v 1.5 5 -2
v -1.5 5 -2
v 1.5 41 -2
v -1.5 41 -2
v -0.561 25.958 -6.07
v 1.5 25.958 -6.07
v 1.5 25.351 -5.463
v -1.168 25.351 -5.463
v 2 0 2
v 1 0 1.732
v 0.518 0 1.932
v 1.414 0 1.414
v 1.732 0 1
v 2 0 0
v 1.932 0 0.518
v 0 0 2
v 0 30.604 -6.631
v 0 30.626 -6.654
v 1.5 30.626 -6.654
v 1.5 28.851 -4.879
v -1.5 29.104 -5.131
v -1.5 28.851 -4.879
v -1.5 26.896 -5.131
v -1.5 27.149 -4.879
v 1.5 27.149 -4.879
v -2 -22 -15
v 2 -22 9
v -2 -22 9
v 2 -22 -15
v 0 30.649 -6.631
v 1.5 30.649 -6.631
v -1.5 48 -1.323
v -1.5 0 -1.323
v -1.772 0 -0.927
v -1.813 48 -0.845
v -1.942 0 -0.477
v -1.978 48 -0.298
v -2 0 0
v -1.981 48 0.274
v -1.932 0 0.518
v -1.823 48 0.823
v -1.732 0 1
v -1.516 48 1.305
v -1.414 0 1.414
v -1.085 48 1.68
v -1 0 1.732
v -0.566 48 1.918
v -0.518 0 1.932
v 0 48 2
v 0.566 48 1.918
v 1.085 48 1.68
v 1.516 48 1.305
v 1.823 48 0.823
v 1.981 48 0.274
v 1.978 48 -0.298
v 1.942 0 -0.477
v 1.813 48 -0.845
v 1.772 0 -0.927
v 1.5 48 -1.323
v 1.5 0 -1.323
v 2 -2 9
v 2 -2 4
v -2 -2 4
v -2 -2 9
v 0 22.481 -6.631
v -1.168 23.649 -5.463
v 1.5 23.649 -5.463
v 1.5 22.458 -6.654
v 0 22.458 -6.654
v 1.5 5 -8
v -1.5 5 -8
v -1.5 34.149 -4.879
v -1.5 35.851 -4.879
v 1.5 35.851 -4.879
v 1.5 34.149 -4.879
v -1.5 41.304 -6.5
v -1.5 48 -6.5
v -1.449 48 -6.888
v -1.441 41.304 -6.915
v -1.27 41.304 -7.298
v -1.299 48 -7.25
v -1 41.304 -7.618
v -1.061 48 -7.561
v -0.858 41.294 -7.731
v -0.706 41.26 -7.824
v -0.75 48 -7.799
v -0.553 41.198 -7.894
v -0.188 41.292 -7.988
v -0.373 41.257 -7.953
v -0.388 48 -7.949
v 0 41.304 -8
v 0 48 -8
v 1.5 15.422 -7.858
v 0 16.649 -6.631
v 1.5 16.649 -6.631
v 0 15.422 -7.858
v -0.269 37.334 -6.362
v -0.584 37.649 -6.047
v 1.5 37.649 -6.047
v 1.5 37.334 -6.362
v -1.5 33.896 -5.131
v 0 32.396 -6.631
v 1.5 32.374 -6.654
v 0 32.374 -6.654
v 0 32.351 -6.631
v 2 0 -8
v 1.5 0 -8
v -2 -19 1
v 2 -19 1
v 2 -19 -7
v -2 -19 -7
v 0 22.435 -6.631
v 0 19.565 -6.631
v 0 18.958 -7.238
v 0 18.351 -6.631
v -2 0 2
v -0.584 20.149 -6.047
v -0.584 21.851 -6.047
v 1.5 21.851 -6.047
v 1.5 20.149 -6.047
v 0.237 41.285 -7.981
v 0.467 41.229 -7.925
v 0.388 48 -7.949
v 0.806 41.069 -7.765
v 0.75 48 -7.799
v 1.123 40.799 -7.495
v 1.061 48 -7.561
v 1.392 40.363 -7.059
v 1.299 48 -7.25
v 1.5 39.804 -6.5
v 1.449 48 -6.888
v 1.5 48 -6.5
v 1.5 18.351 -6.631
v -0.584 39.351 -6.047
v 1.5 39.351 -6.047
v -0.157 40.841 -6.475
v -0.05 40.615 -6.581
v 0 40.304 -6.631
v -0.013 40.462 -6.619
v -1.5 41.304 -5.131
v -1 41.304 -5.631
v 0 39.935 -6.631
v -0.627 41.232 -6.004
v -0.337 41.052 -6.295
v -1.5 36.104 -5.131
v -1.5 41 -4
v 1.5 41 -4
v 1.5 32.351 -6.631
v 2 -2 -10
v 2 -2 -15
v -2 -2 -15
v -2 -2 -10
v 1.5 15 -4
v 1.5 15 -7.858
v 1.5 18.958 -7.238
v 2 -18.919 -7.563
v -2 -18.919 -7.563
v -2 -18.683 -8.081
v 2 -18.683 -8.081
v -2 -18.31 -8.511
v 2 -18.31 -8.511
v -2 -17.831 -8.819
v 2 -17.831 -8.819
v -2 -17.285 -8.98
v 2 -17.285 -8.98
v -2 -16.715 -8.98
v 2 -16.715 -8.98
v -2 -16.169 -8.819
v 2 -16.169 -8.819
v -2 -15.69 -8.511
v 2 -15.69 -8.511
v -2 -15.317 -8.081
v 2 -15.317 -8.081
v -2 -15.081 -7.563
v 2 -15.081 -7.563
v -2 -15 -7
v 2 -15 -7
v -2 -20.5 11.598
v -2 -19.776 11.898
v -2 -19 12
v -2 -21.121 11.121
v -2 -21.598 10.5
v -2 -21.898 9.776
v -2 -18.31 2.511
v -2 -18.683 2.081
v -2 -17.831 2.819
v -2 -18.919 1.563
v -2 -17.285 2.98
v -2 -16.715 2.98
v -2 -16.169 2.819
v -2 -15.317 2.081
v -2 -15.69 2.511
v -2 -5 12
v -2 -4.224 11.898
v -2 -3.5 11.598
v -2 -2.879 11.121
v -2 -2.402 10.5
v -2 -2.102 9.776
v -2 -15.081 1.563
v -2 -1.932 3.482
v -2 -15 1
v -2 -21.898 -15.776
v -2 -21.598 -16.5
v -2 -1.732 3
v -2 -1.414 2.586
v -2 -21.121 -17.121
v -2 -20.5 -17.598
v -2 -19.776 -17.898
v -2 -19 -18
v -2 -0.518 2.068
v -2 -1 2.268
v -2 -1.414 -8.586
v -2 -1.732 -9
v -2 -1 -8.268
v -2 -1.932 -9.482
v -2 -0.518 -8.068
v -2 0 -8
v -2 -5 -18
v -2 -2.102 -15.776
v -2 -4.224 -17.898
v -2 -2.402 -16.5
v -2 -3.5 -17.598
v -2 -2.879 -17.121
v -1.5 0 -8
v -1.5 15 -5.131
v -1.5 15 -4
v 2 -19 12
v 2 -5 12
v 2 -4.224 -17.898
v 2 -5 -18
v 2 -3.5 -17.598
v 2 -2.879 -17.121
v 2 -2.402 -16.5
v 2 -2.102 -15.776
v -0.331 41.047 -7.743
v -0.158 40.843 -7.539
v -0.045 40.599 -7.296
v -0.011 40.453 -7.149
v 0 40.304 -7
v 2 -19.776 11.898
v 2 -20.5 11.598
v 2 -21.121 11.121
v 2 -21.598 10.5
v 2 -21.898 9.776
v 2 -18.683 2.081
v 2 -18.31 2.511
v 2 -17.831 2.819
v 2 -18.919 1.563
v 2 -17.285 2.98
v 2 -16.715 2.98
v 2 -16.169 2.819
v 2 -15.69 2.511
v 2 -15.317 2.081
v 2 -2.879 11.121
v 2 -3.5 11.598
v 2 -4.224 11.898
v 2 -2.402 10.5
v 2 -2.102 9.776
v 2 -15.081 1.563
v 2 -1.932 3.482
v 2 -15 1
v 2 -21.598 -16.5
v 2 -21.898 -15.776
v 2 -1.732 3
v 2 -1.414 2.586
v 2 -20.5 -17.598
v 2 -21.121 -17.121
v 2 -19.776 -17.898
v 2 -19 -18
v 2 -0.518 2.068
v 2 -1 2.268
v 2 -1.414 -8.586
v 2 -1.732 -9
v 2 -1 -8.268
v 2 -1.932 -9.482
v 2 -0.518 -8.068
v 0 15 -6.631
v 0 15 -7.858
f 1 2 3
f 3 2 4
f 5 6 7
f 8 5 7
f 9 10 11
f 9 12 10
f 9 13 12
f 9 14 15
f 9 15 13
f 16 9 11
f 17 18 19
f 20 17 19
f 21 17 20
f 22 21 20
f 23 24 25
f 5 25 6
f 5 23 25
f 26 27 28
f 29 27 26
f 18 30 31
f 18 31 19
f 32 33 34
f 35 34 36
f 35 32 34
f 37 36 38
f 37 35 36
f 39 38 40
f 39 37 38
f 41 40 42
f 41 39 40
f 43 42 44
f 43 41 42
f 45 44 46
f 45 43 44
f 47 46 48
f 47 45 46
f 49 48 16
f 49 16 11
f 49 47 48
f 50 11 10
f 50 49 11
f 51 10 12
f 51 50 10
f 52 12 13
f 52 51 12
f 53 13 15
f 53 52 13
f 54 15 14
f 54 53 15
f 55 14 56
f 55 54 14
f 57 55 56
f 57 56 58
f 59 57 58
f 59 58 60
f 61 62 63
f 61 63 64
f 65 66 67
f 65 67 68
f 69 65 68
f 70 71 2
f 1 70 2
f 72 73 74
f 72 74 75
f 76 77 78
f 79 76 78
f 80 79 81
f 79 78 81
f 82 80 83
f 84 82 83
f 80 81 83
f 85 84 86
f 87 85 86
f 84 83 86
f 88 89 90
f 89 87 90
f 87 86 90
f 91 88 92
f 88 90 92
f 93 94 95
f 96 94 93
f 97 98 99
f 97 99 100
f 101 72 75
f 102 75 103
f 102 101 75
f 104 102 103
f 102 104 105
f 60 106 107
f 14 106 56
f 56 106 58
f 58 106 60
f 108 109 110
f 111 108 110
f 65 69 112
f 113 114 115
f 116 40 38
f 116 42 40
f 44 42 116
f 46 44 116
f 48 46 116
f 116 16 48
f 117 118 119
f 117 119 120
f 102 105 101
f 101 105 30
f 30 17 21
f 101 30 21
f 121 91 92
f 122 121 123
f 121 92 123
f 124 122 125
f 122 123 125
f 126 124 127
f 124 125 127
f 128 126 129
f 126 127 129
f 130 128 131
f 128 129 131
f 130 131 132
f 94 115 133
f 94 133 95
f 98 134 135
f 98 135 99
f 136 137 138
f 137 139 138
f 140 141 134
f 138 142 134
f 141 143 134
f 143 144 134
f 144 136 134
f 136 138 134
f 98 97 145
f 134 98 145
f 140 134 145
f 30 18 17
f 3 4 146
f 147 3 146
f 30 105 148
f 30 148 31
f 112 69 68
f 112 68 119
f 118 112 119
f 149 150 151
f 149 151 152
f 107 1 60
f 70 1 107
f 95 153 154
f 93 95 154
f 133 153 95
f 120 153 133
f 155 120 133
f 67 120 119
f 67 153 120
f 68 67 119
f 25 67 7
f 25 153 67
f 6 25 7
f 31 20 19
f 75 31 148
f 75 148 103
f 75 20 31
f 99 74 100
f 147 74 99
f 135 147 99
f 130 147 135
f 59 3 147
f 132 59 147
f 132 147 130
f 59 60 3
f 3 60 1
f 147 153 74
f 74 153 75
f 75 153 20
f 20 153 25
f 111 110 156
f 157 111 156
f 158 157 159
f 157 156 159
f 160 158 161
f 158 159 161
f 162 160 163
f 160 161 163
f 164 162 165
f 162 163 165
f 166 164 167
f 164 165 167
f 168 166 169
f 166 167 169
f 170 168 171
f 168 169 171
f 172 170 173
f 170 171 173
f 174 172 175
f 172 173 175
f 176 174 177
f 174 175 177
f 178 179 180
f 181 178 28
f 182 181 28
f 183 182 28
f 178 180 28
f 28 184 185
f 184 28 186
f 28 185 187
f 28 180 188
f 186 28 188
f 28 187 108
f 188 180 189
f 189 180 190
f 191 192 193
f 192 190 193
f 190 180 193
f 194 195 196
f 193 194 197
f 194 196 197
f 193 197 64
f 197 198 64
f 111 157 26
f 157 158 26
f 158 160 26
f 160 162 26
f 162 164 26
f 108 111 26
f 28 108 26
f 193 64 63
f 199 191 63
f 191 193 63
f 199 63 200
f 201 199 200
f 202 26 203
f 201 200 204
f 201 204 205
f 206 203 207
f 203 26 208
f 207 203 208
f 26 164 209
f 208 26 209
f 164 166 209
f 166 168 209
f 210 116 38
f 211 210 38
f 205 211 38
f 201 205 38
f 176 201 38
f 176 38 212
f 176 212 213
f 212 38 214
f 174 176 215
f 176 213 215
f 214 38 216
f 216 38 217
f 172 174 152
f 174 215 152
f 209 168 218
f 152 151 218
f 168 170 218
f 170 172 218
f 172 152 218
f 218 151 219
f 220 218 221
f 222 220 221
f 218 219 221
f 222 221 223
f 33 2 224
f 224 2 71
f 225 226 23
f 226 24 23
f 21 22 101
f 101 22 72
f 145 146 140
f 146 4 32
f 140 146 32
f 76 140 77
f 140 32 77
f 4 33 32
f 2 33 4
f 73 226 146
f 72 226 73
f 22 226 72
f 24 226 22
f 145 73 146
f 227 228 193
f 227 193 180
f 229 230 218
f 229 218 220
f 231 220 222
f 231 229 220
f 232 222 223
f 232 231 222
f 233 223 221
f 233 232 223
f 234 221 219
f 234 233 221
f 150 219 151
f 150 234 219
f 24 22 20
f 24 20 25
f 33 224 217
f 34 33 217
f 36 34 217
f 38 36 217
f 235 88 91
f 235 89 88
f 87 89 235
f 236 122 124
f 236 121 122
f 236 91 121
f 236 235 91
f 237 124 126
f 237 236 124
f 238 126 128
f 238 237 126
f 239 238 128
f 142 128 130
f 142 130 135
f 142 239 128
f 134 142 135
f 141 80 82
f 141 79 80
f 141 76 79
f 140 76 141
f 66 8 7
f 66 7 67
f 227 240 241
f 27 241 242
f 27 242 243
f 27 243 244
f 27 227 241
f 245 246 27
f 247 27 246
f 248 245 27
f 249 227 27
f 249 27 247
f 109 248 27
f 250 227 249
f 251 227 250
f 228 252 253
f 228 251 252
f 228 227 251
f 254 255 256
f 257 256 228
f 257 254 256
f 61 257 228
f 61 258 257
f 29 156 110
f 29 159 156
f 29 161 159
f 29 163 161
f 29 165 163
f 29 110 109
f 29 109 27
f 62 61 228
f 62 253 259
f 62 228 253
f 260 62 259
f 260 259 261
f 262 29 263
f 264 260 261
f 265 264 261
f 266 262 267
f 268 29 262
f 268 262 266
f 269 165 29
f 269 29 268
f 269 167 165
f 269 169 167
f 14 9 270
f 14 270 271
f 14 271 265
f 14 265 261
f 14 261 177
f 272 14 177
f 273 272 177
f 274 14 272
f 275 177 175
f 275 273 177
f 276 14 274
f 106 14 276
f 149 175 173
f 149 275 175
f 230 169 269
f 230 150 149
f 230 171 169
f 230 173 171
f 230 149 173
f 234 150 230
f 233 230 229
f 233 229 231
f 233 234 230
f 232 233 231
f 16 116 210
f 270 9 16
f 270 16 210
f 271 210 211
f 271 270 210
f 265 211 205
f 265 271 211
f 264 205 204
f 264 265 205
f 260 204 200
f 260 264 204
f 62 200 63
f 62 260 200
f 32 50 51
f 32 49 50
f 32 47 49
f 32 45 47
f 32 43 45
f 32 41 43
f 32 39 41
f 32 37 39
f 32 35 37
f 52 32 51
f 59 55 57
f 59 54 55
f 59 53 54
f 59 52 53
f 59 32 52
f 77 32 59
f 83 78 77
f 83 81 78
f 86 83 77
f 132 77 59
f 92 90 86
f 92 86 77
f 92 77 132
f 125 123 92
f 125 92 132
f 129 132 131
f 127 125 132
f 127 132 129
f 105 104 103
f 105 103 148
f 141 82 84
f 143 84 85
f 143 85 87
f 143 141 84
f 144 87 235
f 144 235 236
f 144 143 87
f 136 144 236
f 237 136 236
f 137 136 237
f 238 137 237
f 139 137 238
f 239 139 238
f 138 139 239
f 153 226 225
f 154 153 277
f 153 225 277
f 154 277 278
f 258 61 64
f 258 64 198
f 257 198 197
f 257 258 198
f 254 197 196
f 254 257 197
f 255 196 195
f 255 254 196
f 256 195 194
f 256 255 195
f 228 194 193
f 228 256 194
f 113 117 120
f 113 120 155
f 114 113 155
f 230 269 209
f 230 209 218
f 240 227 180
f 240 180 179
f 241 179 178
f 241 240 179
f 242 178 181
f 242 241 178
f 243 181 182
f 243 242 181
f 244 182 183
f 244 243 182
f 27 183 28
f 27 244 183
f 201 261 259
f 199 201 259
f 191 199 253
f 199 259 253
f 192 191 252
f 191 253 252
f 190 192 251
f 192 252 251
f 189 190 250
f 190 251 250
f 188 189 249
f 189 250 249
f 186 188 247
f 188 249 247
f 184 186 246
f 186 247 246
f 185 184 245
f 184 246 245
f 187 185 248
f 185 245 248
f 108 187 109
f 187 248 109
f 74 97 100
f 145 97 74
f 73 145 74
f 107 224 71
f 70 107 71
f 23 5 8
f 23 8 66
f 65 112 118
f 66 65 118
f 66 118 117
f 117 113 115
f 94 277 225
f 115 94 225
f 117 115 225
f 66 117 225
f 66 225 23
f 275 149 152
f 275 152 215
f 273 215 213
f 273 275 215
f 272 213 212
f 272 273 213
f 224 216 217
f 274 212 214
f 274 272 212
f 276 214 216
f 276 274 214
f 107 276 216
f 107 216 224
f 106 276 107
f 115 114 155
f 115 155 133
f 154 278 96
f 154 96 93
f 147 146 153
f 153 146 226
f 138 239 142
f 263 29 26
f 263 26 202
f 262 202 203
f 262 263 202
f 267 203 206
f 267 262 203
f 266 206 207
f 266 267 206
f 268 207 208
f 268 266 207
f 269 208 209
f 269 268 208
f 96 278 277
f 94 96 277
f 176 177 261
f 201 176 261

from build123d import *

# Parameters (mm, degrees)
BOSS_EXTRUDE2_DEPTH      = 1.5
BOSS_EXTRUDE2_DEPTH_BACK = 1.5
SKETCH2_R                = 2
BOSS_EXTRUDE3_DEPTH      = 48
BOSS_EXTRUDE4_DEPTH      = 0.5
BOSS_EXTRUDE4_DEPTH_BACK = 3.5
CUT_EXTRUDE1_DEPTH       = 3
CUT_EXTRUDE2_DEPTH       = 26.3039
FILLET1_R                = 1
CUT_EXTRUDE4_REACH       = 74.305
CUT_EXTRUDE5_REACH       = 43.195
SKETCH10_W               = 3
SKETCH10_H               = 0.141883177


with BuildPart() as part:
    # Sketch1 → Boss-Extrude2 (new, two sides: drawn at the far end of the back side and taken through both)
    with BuildSketch(Plane(origin=(0, 108.422012546, -620.347507802), x_dir=(0, 0, -1), z_dir=(1, 0, 0)).offset(-BOSS_EXTRUDE2_DEPTH_BACK)):
        Polygon((-620.347507802, -60.422012546), (-620.347507802, -108.422012546), (-612.347507802, -108.422012546), (-612.347507802, -103.422012546), (-618.347507802, -103.422012546), (-618.347507802, -67.422012546), (-616.347507802, -67.422012546), (-616.347507802, -93.422012546), (-612.347507802, -93.422012546), (-612.347507802, -64.422012546), (-612.347507802, -60.422012546), align=None)
    extrude(amount=BOSS_EXTRUDE2_DEPTH + BOSS_EXTRUDE2_DEPTH_BACK)

    # Sketch2 → Boss-Extrude3 (add)
    with BuildSketch(Plane(origin=(0, 48, 0), x_dir=(1, 0, 0), z_dir=(0, 1, 0))):
        Circle(SKETCH2_R)
    extrude(amount=-BOSS_EXTRUDE3_DEPTH)

    # Sketch4 → Boss-Extrude4 (add, two sides: drawn at the far end of the back side and taken through both)
    with BuildSketch(Plane.ZY.offset(1.5).offset(-BOSS_EXTRUDE4_DEPTH_BACK)):
        with BuildLine():
            Line((-8, 0), (2, 0))
            ThreePointArc((2, 0), (2.585786438, -1.414213562), (4, -2))
            Line((4, -2), (9, -2))
            ThreePointArc((9, -2), (11.121320344, -2.878679656), (12, -5))
            Line((12, -5), (12, -19))
            ThreePointArc((12, -19), (11.121320344, -21.121320344), (9, -22))
            Line((9, -22), (-15, -22))
            ThreePointArc((-15, -22), (-17.121320344, -21.121320344), (-18, -19))
            Line((-18, -19), (-18, -5))
            ThreePointArc((-18, -5), (-17.121320344, -2.878679656), (-15, -2))
            Line((-15, -2), (-10, -2))
            ThreePointArc((-10, -2), (-8.585786438, -1.414213562), (-8, 0))
        make_face()
        with BuildLine():
            Line((-7, -15), (1, -15))
            ThreePointArc((1, -15), (3, -17), (1, -19))
            Line((1, -19), (-7, -19))
            ThreePointArc((-7, -19), (-9, -17), (-7, -15))
        make_face(mode=Mode.SUBTRACT)
    extrude(amount=BOSS_EXTRUDE4_DEPTH + BOSS_EXTRUDE4_DEPTH_BACK)

    # Sketch6 → Cut-Extrude1 (cut)
    with BuildSketch(Plane.ZY.offset(1.5)):
        Polygon((-6.6312, 18.3509), (-6.6312, 16.6491), (-8.2803, 15), (-10.2803, 15), (-10.2803, 41.5842), (-8.2803, 41.5842), (-6.047, 39.3509), (-6.047, 37.6491), (-6.3619, 37.3342), (-4.8786, 35.8509), (-4.8786, 34.1491), (-6.654, 32.3737), (-6.6312, 32.3509), (-6.6312, 30.6491), (-6.654, 30.6263), (-4.8786, 28.8509), (-4.8786, 27.1491), (-6.0698, 25.9579), (-5.4628, 25.3509), (-5.4628, 23.6491), (-6.654, 22.4579), (-6.047, 21.8509), (-6.047, 20.1491), (-7.2382, 18.9579), align=None)
    extrude(amount=-CUT_EXTRUDE1_DEPTH, mode=Mode.SUBTRACT)

    # Sketch7 → Cut-Extrude2 (cut)
    with BuildSketch(Plane.XZ.offset(-15)):
        Polygon((0, -6.6312), (-1.5, -5.1312), (-1.5, -8), (0, -8), align=None)
    extrude(amount=-CUT_EXTRUDE2_DEPTH, mode=Mode.SUBTRACT)

    # Fillet1
    fillet1_edges = [part.edges().sort_by_distance(p)[0] for p in [
        (0, 41.3039, -7.3156),
    ]]
    fillet(fillet1_edges, radius=FILLET1_R)

    # Cut-Extrude4: up to this plane
    cut_extrude4_end = Plane(origin=(28.627440951, 39.3509, -6.047), z_dir=(2.4829835882571804e-15, 0.7071067811865529, 0.7071067811865422))
    # Sketch9 → Cut-Extrude4 (cut, up to the surface)
    with BuildSketch(Plane(origin=(0, 48, 0), x_dir=(1, 0, 0), z_dir=(0, 1, 0)), mode=Mode.PRIVATE) as cut_extrude4_sk1:
        with BuildLine():
            ThreePointArc((-1.5, 6.5), (-1.060660172, 7.560660172), (0, 8))
            Line((0, 8), (-1.5, 8))
            Line((-1.5, 8), (-1.5, 6.5))
        make_face()
    cut_extrude4_tool1 = split(extrude(cut_extrude4_sk1.sketch, amount=-CUT_EXTRUDE4_REACH, mode=Mode.PRIVATE), bisect_by=cut_extrude4_end, keep=Keep.BOTH, mode=Mode.PRIVATE)
    add(cut_extrude4_tool1.solids().sort_by_distance((-1.164948, 48, -7.664948))[0], mode=Mode.SUBTRACT)
    # Sketch9 → Cut-Extrude4 (cut, up to the surface)
    with BuildSketch(Plane(origin=(0, 48, 0), x_dir=(1, 0, 0), z_dir=(0, 1, 0)), mode=Mode.PRIVATE) as cut_extrude4_sk2:
        with BuildLine():
            Line((1.5, 6.5), (1.5, 8))
            Line((1.5, 8), (0, 8))
            ThreePointArc((0, 8), (1.060660172, 7.560660172), (1.5, 6.5))
        make_face()
    cut_extrude4_tool2 = split(extrude(cut_extrude4_sk2.sketch, amount=-CUT_EXTRUDE4_REACH, mode=Mode.PRIVATE), bisect_by=cut_extrude4_end, keep=Keep.BOTH, mode=Mode.PRIVATE)
    add(cut_extrude4_tool2.solids().sort_by_distance((1.164948, 48, -7.664948))[0], mode=Mode.SUBTRACT)

    # Cut-Extrude5: up to this plane
    cut_extrude5_end = Plane(origin=(28.627440951, 16.6491, -6.6312), z_dir=(2.462807656596698e-15, -0.707106781186546, 0.707106781186549))
    # Sketch10 → Cut-Extrude5 (cut, up to the surface)
    with BuildSketch(Plane(origin=(0, 15, 0), x_dir=(1, 0, 0), z_dir=(0, 1, 0)), mode=Mode.PRIVATE) as cut_extrude5_sk1:
        with Locations((0, 7.929058411)):
            Rectangle(SKETCH10_W, SKETCH10_H)
    cut_extrude5_tool1 = split(extrude(cut_extrude5_sk1.sketch, amount=CUT_EXTRUDE5_REACH, mode=Mode.PRIVATE), bisect_by=cut_extrude5_end, keep=Keep.BOTH, mode=Mode.PRIVATE)
    add(cut_extrude5_tool1.solids().sort_by_distance((0, 15, -7.929058))[0], mode=Mode.SUBTRACT)


solid = part.part
